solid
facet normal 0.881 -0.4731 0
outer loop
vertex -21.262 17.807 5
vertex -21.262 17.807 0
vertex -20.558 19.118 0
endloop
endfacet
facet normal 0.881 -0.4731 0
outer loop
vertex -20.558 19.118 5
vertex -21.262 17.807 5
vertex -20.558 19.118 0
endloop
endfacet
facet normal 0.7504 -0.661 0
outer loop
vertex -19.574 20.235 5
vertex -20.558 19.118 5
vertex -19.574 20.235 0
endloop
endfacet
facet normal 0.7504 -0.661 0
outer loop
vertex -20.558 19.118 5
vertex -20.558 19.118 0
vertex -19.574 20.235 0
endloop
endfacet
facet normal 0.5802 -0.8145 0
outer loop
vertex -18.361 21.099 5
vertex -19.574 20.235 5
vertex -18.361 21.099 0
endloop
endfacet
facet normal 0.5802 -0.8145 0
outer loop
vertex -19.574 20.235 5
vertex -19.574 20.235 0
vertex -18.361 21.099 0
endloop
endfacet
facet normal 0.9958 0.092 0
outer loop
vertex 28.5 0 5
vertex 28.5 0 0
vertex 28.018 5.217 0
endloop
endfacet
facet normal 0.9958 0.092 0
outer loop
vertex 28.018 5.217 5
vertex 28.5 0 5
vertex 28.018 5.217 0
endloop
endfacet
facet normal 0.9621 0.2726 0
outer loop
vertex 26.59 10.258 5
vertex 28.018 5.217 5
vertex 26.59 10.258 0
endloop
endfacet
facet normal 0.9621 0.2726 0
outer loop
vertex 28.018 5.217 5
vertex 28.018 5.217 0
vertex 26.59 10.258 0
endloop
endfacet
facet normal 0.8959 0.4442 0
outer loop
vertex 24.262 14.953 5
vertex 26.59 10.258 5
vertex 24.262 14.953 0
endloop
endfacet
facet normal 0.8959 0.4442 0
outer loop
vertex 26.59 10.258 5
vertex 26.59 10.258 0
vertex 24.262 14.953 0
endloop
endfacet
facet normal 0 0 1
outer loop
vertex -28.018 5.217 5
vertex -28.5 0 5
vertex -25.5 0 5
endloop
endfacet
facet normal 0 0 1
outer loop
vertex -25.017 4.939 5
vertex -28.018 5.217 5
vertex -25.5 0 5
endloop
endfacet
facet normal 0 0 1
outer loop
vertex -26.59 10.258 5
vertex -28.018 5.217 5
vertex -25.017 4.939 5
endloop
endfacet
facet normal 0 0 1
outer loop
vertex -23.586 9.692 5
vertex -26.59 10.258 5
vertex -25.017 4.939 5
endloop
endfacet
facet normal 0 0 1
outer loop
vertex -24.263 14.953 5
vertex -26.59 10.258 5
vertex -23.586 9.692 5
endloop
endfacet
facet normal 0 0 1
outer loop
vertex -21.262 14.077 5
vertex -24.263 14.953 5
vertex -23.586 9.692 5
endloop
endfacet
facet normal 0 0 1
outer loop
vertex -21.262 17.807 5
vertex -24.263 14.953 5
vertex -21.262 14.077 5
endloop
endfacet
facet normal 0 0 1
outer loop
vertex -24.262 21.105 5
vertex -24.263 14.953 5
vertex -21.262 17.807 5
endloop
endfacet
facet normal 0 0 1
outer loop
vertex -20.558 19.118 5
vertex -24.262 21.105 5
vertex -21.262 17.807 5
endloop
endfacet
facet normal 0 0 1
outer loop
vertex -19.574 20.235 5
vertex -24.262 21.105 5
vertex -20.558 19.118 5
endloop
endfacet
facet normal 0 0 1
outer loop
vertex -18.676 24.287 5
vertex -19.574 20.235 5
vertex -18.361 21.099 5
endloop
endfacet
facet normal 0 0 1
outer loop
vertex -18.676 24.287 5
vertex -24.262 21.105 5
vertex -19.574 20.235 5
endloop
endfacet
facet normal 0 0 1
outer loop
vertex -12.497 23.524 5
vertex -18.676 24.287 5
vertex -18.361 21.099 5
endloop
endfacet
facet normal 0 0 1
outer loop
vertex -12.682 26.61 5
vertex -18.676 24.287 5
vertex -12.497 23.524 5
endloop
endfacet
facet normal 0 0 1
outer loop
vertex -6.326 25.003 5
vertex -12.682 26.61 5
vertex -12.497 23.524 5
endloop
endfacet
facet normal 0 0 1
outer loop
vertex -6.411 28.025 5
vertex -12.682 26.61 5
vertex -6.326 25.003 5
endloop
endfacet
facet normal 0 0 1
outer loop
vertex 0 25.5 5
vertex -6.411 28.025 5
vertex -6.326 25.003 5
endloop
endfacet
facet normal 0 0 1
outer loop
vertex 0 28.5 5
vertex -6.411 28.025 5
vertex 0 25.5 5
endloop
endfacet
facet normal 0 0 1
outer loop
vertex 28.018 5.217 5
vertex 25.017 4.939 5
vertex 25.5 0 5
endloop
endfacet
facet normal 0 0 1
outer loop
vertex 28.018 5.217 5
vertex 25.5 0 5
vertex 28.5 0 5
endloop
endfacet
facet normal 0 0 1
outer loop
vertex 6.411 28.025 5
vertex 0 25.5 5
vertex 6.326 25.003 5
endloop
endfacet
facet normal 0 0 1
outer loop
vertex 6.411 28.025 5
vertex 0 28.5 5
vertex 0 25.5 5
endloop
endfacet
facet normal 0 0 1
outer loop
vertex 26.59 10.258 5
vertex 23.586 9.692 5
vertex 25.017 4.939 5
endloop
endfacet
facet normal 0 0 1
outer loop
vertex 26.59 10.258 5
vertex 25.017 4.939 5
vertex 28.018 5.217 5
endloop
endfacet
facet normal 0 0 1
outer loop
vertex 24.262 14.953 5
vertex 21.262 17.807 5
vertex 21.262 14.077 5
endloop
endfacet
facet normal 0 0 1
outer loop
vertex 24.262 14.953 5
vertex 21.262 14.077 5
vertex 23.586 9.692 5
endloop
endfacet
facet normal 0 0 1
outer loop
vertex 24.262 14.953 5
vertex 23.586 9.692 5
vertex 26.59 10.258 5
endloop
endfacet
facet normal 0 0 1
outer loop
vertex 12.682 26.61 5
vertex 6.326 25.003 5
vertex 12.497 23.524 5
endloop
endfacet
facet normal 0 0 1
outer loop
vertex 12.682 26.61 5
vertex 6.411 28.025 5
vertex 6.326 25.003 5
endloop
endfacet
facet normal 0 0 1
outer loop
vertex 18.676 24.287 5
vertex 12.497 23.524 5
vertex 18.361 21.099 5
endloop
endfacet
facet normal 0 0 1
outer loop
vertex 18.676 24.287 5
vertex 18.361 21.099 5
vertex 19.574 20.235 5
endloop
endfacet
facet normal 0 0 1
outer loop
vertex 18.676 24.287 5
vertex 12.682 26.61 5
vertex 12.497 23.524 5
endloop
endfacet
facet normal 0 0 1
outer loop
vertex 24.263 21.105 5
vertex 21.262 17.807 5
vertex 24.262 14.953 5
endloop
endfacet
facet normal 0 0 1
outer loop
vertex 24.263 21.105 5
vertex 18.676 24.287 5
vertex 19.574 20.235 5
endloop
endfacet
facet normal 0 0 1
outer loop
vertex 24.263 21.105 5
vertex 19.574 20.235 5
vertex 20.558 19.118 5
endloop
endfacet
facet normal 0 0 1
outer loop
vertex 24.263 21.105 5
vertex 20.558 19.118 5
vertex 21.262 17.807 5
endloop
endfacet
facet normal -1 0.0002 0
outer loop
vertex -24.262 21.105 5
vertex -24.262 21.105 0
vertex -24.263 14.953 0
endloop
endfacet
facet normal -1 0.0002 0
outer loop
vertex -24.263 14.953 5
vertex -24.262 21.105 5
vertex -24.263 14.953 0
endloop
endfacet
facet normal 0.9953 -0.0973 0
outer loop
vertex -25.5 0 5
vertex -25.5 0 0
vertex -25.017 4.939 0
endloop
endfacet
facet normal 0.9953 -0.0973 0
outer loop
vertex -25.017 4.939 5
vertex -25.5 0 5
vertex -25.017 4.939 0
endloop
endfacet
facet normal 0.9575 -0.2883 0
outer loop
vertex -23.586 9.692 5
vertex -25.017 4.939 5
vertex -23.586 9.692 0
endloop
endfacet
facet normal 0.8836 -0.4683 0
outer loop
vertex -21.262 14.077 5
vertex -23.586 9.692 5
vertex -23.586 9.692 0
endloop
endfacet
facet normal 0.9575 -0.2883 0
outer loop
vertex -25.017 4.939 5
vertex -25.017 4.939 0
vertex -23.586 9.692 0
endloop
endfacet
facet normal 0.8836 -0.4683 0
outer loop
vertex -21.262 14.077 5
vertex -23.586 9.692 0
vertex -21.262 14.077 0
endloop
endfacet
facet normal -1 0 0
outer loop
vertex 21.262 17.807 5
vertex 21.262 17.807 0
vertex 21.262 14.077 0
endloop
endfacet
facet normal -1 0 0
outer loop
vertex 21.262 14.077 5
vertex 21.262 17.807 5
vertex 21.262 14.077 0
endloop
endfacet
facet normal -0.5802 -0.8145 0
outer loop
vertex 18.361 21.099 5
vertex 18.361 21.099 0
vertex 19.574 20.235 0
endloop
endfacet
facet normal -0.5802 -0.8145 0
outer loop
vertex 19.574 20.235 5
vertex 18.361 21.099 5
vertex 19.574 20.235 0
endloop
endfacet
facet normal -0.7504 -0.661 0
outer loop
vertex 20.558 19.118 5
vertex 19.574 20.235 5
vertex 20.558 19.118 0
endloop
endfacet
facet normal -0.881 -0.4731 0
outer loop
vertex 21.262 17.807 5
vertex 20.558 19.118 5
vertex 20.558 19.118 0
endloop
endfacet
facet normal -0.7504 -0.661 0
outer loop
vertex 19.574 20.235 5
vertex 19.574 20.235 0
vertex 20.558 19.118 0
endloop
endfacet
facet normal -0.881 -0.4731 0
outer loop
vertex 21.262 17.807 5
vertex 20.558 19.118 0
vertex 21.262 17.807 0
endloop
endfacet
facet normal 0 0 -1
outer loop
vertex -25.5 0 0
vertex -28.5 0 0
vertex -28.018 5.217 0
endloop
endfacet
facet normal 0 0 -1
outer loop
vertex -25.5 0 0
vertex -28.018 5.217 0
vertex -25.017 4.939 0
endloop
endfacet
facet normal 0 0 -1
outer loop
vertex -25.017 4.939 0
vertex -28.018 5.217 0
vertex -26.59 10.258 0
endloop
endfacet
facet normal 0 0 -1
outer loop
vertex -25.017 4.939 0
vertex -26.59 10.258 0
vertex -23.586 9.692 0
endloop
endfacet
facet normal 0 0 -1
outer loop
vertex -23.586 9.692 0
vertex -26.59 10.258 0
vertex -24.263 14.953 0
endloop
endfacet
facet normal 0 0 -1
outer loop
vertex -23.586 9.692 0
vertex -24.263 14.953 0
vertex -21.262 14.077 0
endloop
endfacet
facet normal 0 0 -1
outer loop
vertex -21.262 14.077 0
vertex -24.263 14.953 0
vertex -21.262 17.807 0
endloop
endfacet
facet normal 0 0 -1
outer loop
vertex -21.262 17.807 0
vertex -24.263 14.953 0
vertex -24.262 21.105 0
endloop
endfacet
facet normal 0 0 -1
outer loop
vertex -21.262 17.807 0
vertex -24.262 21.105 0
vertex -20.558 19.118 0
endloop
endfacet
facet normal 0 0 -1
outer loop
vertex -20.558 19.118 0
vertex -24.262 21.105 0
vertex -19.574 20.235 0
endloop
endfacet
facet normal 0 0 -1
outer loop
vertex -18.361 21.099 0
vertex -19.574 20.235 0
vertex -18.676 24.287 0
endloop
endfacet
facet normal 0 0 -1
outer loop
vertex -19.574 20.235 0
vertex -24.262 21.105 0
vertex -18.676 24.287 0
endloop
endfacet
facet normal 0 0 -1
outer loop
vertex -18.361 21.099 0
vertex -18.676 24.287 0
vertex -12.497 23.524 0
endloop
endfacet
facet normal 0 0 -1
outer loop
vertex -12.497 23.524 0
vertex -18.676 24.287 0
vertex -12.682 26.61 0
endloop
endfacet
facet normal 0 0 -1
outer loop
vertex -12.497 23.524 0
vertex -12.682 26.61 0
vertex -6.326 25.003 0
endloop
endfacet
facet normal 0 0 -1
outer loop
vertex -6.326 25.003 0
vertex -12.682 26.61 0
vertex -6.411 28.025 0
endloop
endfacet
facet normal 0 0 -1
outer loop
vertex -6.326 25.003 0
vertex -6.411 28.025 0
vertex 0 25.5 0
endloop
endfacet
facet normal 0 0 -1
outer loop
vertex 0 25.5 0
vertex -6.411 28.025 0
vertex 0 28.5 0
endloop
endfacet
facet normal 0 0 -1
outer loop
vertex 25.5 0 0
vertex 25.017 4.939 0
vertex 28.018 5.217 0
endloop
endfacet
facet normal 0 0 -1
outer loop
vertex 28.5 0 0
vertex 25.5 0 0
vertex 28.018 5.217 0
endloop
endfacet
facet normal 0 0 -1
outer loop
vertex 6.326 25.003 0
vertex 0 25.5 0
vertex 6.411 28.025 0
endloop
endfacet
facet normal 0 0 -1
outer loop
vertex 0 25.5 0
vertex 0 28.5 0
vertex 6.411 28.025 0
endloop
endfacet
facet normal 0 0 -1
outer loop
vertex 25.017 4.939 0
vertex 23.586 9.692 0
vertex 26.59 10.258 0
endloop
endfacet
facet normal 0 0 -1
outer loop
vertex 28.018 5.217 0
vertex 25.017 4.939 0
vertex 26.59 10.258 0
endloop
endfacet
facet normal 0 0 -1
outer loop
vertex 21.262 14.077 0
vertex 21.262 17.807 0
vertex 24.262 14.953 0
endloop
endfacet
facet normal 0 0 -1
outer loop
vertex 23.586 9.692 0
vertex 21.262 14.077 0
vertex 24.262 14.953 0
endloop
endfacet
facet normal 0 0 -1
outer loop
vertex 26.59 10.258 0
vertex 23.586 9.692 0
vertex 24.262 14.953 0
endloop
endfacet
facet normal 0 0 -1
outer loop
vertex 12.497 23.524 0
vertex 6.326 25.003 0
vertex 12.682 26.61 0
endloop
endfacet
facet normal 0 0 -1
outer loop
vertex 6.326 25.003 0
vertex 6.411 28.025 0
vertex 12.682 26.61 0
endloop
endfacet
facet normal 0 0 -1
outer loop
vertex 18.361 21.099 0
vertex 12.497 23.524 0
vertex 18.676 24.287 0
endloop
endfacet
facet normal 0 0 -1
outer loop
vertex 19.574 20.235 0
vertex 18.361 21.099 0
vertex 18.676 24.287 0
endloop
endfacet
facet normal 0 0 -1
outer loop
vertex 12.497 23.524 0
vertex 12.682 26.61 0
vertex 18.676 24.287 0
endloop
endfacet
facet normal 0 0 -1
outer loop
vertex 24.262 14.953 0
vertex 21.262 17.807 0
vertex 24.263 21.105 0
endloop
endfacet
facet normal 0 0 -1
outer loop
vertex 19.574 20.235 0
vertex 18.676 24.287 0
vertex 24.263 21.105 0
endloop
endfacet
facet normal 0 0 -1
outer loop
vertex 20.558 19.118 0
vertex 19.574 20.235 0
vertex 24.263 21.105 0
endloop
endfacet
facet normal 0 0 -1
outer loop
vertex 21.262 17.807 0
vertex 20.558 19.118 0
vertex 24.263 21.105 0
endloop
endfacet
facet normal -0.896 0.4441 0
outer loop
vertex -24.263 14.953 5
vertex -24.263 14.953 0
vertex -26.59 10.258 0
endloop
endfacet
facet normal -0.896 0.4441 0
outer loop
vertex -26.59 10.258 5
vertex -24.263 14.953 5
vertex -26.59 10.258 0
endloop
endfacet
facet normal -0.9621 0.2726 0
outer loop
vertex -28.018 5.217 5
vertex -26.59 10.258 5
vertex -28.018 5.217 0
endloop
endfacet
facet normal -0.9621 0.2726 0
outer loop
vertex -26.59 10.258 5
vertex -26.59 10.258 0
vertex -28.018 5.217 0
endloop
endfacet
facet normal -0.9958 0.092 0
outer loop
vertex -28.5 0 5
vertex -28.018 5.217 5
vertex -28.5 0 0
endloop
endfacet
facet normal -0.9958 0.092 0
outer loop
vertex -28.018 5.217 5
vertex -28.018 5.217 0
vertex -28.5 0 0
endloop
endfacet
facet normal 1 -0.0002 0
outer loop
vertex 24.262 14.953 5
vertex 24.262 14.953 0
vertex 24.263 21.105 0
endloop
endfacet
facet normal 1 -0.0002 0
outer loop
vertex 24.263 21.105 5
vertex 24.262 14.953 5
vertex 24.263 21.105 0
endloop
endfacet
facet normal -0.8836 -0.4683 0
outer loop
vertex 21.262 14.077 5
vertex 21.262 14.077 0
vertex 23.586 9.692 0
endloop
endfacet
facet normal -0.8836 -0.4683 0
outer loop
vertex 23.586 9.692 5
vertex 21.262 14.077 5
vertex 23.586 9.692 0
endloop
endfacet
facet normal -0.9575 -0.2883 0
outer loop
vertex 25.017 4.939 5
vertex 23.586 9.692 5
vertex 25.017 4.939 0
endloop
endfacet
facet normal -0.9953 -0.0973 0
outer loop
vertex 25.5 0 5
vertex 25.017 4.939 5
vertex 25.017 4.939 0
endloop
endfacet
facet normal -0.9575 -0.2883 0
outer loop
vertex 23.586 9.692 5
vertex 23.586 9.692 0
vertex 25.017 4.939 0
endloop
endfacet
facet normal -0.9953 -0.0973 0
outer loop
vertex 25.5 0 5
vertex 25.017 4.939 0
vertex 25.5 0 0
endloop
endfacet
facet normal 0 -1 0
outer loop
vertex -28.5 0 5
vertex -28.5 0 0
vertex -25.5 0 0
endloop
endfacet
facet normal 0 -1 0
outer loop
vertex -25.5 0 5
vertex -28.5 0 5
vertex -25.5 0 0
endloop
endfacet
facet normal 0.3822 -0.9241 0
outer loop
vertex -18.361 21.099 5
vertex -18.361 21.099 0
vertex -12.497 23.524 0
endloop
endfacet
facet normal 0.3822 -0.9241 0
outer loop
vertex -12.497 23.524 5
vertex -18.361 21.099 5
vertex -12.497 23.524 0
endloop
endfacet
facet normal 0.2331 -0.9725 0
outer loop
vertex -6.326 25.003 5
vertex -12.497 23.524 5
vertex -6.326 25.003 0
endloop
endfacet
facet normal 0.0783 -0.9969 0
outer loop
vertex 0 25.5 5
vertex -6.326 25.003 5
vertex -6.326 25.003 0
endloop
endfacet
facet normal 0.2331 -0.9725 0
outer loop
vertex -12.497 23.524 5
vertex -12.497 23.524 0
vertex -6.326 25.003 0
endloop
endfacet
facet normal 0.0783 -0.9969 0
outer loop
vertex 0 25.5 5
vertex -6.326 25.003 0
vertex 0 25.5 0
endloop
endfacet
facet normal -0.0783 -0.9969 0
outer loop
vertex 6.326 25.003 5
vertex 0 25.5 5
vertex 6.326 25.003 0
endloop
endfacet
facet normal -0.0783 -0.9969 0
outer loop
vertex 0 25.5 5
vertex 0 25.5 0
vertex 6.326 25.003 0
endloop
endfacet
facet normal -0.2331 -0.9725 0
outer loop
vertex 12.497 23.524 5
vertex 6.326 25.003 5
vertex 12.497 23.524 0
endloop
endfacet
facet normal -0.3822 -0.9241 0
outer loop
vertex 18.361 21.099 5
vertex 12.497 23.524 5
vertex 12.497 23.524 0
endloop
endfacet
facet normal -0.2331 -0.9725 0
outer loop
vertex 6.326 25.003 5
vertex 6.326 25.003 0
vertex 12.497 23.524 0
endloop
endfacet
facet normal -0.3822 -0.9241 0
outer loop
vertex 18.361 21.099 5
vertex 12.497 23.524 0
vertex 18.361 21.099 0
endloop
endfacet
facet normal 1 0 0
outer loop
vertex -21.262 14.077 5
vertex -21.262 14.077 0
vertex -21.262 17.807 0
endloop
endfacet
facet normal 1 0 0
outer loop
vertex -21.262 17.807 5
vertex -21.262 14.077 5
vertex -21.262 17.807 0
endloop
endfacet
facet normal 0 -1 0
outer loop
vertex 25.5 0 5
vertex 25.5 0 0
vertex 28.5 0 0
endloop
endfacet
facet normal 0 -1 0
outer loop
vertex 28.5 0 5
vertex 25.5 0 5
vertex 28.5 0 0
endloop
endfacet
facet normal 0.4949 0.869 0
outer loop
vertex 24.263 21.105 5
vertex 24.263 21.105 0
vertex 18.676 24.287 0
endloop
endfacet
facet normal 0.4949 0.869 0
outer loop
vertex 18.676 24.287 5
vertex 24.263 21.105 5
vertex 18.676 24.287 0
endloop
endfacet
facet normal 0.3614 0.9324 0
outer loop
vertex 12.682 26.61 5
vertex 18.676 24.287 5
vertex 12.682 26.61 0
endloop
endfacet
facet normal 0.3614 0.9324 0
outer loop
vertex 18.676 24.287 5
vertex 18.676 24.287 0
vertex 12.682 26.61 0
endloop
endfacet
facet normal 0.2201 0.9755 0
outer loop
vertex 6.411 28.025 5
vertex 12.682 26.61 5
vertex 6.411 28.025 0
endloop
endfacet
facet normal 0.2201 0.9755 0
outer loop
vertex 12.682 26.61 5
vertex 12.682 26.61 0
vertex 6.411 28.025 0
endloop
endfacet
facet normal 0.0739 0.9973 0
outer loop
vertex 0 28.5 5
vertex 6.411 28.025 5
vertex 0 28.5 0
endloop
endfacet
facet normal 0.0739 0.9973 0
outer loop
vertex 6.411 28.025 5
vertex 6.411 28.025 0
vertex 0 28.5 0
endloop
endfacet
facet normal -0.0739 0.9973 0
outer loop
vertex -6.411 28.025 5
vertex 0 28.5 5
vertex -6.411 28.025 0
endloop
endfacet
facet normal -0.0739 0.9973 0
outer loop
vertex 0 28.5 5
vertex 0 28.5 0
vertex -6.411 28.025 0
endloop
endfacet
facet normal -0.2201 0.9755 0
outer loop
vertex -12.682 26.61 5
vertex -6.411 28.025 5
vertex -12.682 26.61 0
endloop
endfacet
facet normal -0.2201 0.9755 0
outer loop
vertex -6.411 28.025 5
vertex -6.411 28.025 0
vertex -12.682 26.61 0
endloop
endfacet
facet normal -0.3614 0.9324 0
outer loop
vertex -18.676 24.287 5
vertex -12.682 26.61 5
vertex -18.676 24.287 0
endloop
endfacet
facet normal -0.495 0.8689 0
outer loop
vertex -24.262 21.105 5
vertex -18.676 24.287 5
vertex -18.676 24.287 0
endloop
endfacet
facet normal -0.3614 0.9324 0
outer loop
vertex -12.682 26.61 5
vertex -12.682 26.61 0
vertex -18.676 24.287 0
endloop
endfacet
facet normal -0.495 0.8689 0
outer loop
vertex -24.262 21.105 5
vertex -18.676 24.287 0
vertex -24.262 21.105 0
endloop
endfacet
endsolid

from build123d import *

# Parameters (mm, degrees)
BOSS_EXTRUDE2_DEPTH = 5


with BuildPart() as part:
    # Sketch1 → Boss-Extrude2 (new body)
    with BuildSketch(Plane.XY):
        with BuildLine():
            Line((-28.5, 0), (-25.5, 0))
            ThreePointArc((-25.5, 0), (-24.417654986, 7.350382643), (-21.2625, 14.076792737))
            Line((-21.2625, 14.076792737), (-21.2625, 17.80655265))
            ThreePointArc((-21.2625, 17.80655265), (-20.098232577, 19.704816367), (-18.361461142, 21.098569843))
            ThreePointArc((-18.361461142, 21.098569843), (0, 25.5), (18.361461142, 21.098569843))
            ThreePointArc((18.361461142, 21.098569843), (20.098232577, 19.704816367), (21.2625, 17.80655265))
            Line((21.2625, 17.80655265), (21.2625, 14.076792737))
            ThreePointArc((21.2625, 14.076792737), (24.417654986, 7.350382643), (25.5, 0))
            Line((25.5, 0), (28.5, 0))
            ThreePointArc((28.5, 0), (27.420168216, 7.770738382), (24.2625, 14.952628322))
            Line((24.2625, 14.952628322), (24.2625, 21.105139437))
            ThreePointArc((24.2625, 21.105139437), (0, 28.5), (-24.2625, 21.105139437))
            Line((-24.2625, 21.105139437), (-24.2625, 14.952628322))
            ThreePointArc((-24.2625, 14.952628322), (-27.420168216, 7.770738382), (-28.5, 0))
        make_face()
    extrude(amount=BOSS_EXTRUDE2_DEPTH)


solid = part.part
